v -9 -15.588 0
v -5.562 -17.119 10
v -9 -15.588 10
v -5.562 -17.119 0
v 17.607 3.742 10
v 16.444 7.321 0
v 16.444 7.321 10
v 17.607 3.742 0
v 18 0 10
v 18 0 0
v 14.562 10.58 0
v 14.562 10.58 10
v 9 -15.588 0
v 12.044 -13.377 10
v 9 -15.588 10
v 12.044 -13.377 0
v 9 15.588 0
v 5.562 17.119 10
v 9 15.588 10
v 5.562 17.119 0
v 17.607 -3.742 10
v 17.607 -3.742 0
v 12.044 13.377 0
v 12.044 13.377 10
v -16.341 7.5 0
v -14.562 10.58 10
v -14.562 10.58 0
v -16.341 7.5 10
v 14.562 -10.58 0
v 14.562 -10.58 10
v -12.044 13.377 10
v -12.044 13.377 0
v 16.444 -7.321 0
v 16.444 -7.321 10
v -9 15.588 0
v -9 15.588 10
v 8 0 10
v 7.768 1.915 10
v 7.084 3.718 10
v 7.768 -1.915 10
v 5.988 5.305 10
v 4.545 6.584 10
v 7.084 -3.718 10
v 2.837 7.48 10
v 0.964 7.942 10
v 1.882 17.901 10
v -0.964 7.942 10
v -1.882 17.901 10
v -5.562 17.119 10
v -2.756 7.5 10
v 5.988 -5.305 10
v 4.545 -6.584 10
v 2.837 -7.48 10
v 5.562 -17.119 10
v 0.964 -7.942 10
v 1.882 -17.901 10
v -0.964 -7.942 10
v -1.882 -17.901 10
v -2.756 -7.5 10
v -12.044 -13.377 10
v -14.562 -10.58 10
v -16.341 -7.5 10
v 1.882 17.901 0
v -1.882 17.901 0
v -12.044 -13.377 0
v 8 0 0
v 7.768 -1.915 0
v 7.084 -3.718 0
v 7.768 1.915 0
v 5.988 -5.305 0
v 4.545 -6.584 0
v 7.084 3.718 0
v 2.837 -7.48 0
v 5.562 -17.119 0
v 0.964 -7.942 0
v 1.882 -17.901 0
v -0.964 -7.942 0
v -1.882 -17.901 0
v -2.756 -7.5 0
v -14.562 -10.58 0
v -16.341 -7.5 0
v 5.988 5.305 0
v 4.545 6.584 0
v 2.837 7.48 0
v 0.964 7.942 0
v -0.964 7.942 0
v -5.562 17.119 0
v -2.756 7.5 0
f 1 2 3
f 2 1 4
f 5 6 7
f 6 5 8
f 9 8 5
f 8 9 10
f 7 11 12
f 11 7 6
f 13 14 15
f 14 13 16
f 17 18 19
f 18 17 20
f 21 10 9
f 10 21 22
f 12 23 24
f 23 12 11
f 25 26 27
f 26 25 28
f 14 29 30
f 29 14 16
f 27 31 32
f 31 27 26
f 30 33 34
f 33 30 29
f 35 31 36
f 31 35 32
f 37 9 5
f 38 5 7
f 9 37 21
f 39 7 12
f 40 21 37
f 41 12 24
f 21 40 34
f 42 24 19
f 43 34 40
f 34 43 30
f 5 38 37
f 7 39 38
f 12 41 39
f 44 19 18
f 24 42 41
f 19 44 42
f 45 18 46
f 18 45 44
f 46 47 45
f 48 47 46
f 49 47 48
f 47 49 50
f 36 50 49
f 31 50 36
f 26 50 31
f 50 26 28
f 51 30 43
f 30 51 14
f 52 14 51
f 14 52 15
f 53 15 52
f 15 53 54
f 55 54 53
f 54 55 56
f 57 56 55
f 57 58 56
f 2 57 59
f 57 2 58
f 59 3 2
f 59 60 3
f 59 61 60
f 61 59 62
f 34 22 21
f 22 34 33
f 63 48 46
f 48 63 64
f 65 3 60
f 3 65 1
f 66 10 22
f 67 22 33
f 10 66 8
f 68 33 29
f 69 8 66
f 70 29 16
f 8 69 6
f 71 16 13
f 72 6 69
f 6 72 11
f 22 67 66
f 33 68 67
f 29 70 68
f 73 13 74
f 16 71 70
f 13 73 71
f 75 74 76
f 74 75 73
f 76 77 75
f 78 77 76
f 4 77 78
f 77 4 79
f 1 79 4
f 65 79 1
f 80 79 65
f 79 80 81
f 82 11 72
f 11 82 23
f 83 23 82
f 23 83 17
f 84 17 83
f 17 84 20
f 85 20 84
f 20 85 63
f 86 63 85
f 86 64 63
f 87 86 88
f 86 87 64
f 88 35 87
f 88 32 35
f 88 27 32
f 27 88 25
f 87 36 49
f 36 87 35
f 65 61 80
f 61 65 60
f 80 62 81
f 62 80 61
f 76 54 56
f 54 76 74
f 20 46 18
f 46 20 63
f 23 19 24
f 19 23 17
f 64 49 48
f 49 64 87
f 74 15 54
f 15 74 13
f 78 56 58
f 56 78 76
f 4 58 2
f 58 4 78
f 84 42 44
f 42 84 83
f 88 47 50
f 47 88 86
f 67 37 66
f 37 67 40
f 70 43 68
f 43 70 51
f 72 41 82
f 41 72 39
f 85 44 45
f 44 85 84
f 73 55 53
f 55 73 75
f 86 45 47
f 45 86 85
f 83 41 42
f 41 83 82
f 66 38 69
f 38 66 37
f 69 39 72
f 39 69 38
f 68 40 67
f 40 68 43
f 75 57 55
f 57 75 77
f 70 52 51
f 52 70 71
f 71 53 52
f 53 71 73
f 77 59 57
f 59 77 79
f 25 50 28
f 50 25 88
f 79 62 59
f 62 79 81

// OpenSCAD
// Diameter of pipe [mm] *default of 16 fits 1/2"
innerDiameter=16;

// Outer diameter of tool [mm]
outerDiameter=36;

// Thickness of tool [mm]
thickness=10;

difference() {
	cylinder(h=thickness,r=outerDiameter/2);
	translate([0,0,-0.5])
	cylinder(h=thickness+1,r=innerDiameter/2);
	translate([-outerDiameter,-((innerDiameter-1)/2),-0.5])
	cube([outerDiameter,innerDiameter-1,thickness+1]);
}
